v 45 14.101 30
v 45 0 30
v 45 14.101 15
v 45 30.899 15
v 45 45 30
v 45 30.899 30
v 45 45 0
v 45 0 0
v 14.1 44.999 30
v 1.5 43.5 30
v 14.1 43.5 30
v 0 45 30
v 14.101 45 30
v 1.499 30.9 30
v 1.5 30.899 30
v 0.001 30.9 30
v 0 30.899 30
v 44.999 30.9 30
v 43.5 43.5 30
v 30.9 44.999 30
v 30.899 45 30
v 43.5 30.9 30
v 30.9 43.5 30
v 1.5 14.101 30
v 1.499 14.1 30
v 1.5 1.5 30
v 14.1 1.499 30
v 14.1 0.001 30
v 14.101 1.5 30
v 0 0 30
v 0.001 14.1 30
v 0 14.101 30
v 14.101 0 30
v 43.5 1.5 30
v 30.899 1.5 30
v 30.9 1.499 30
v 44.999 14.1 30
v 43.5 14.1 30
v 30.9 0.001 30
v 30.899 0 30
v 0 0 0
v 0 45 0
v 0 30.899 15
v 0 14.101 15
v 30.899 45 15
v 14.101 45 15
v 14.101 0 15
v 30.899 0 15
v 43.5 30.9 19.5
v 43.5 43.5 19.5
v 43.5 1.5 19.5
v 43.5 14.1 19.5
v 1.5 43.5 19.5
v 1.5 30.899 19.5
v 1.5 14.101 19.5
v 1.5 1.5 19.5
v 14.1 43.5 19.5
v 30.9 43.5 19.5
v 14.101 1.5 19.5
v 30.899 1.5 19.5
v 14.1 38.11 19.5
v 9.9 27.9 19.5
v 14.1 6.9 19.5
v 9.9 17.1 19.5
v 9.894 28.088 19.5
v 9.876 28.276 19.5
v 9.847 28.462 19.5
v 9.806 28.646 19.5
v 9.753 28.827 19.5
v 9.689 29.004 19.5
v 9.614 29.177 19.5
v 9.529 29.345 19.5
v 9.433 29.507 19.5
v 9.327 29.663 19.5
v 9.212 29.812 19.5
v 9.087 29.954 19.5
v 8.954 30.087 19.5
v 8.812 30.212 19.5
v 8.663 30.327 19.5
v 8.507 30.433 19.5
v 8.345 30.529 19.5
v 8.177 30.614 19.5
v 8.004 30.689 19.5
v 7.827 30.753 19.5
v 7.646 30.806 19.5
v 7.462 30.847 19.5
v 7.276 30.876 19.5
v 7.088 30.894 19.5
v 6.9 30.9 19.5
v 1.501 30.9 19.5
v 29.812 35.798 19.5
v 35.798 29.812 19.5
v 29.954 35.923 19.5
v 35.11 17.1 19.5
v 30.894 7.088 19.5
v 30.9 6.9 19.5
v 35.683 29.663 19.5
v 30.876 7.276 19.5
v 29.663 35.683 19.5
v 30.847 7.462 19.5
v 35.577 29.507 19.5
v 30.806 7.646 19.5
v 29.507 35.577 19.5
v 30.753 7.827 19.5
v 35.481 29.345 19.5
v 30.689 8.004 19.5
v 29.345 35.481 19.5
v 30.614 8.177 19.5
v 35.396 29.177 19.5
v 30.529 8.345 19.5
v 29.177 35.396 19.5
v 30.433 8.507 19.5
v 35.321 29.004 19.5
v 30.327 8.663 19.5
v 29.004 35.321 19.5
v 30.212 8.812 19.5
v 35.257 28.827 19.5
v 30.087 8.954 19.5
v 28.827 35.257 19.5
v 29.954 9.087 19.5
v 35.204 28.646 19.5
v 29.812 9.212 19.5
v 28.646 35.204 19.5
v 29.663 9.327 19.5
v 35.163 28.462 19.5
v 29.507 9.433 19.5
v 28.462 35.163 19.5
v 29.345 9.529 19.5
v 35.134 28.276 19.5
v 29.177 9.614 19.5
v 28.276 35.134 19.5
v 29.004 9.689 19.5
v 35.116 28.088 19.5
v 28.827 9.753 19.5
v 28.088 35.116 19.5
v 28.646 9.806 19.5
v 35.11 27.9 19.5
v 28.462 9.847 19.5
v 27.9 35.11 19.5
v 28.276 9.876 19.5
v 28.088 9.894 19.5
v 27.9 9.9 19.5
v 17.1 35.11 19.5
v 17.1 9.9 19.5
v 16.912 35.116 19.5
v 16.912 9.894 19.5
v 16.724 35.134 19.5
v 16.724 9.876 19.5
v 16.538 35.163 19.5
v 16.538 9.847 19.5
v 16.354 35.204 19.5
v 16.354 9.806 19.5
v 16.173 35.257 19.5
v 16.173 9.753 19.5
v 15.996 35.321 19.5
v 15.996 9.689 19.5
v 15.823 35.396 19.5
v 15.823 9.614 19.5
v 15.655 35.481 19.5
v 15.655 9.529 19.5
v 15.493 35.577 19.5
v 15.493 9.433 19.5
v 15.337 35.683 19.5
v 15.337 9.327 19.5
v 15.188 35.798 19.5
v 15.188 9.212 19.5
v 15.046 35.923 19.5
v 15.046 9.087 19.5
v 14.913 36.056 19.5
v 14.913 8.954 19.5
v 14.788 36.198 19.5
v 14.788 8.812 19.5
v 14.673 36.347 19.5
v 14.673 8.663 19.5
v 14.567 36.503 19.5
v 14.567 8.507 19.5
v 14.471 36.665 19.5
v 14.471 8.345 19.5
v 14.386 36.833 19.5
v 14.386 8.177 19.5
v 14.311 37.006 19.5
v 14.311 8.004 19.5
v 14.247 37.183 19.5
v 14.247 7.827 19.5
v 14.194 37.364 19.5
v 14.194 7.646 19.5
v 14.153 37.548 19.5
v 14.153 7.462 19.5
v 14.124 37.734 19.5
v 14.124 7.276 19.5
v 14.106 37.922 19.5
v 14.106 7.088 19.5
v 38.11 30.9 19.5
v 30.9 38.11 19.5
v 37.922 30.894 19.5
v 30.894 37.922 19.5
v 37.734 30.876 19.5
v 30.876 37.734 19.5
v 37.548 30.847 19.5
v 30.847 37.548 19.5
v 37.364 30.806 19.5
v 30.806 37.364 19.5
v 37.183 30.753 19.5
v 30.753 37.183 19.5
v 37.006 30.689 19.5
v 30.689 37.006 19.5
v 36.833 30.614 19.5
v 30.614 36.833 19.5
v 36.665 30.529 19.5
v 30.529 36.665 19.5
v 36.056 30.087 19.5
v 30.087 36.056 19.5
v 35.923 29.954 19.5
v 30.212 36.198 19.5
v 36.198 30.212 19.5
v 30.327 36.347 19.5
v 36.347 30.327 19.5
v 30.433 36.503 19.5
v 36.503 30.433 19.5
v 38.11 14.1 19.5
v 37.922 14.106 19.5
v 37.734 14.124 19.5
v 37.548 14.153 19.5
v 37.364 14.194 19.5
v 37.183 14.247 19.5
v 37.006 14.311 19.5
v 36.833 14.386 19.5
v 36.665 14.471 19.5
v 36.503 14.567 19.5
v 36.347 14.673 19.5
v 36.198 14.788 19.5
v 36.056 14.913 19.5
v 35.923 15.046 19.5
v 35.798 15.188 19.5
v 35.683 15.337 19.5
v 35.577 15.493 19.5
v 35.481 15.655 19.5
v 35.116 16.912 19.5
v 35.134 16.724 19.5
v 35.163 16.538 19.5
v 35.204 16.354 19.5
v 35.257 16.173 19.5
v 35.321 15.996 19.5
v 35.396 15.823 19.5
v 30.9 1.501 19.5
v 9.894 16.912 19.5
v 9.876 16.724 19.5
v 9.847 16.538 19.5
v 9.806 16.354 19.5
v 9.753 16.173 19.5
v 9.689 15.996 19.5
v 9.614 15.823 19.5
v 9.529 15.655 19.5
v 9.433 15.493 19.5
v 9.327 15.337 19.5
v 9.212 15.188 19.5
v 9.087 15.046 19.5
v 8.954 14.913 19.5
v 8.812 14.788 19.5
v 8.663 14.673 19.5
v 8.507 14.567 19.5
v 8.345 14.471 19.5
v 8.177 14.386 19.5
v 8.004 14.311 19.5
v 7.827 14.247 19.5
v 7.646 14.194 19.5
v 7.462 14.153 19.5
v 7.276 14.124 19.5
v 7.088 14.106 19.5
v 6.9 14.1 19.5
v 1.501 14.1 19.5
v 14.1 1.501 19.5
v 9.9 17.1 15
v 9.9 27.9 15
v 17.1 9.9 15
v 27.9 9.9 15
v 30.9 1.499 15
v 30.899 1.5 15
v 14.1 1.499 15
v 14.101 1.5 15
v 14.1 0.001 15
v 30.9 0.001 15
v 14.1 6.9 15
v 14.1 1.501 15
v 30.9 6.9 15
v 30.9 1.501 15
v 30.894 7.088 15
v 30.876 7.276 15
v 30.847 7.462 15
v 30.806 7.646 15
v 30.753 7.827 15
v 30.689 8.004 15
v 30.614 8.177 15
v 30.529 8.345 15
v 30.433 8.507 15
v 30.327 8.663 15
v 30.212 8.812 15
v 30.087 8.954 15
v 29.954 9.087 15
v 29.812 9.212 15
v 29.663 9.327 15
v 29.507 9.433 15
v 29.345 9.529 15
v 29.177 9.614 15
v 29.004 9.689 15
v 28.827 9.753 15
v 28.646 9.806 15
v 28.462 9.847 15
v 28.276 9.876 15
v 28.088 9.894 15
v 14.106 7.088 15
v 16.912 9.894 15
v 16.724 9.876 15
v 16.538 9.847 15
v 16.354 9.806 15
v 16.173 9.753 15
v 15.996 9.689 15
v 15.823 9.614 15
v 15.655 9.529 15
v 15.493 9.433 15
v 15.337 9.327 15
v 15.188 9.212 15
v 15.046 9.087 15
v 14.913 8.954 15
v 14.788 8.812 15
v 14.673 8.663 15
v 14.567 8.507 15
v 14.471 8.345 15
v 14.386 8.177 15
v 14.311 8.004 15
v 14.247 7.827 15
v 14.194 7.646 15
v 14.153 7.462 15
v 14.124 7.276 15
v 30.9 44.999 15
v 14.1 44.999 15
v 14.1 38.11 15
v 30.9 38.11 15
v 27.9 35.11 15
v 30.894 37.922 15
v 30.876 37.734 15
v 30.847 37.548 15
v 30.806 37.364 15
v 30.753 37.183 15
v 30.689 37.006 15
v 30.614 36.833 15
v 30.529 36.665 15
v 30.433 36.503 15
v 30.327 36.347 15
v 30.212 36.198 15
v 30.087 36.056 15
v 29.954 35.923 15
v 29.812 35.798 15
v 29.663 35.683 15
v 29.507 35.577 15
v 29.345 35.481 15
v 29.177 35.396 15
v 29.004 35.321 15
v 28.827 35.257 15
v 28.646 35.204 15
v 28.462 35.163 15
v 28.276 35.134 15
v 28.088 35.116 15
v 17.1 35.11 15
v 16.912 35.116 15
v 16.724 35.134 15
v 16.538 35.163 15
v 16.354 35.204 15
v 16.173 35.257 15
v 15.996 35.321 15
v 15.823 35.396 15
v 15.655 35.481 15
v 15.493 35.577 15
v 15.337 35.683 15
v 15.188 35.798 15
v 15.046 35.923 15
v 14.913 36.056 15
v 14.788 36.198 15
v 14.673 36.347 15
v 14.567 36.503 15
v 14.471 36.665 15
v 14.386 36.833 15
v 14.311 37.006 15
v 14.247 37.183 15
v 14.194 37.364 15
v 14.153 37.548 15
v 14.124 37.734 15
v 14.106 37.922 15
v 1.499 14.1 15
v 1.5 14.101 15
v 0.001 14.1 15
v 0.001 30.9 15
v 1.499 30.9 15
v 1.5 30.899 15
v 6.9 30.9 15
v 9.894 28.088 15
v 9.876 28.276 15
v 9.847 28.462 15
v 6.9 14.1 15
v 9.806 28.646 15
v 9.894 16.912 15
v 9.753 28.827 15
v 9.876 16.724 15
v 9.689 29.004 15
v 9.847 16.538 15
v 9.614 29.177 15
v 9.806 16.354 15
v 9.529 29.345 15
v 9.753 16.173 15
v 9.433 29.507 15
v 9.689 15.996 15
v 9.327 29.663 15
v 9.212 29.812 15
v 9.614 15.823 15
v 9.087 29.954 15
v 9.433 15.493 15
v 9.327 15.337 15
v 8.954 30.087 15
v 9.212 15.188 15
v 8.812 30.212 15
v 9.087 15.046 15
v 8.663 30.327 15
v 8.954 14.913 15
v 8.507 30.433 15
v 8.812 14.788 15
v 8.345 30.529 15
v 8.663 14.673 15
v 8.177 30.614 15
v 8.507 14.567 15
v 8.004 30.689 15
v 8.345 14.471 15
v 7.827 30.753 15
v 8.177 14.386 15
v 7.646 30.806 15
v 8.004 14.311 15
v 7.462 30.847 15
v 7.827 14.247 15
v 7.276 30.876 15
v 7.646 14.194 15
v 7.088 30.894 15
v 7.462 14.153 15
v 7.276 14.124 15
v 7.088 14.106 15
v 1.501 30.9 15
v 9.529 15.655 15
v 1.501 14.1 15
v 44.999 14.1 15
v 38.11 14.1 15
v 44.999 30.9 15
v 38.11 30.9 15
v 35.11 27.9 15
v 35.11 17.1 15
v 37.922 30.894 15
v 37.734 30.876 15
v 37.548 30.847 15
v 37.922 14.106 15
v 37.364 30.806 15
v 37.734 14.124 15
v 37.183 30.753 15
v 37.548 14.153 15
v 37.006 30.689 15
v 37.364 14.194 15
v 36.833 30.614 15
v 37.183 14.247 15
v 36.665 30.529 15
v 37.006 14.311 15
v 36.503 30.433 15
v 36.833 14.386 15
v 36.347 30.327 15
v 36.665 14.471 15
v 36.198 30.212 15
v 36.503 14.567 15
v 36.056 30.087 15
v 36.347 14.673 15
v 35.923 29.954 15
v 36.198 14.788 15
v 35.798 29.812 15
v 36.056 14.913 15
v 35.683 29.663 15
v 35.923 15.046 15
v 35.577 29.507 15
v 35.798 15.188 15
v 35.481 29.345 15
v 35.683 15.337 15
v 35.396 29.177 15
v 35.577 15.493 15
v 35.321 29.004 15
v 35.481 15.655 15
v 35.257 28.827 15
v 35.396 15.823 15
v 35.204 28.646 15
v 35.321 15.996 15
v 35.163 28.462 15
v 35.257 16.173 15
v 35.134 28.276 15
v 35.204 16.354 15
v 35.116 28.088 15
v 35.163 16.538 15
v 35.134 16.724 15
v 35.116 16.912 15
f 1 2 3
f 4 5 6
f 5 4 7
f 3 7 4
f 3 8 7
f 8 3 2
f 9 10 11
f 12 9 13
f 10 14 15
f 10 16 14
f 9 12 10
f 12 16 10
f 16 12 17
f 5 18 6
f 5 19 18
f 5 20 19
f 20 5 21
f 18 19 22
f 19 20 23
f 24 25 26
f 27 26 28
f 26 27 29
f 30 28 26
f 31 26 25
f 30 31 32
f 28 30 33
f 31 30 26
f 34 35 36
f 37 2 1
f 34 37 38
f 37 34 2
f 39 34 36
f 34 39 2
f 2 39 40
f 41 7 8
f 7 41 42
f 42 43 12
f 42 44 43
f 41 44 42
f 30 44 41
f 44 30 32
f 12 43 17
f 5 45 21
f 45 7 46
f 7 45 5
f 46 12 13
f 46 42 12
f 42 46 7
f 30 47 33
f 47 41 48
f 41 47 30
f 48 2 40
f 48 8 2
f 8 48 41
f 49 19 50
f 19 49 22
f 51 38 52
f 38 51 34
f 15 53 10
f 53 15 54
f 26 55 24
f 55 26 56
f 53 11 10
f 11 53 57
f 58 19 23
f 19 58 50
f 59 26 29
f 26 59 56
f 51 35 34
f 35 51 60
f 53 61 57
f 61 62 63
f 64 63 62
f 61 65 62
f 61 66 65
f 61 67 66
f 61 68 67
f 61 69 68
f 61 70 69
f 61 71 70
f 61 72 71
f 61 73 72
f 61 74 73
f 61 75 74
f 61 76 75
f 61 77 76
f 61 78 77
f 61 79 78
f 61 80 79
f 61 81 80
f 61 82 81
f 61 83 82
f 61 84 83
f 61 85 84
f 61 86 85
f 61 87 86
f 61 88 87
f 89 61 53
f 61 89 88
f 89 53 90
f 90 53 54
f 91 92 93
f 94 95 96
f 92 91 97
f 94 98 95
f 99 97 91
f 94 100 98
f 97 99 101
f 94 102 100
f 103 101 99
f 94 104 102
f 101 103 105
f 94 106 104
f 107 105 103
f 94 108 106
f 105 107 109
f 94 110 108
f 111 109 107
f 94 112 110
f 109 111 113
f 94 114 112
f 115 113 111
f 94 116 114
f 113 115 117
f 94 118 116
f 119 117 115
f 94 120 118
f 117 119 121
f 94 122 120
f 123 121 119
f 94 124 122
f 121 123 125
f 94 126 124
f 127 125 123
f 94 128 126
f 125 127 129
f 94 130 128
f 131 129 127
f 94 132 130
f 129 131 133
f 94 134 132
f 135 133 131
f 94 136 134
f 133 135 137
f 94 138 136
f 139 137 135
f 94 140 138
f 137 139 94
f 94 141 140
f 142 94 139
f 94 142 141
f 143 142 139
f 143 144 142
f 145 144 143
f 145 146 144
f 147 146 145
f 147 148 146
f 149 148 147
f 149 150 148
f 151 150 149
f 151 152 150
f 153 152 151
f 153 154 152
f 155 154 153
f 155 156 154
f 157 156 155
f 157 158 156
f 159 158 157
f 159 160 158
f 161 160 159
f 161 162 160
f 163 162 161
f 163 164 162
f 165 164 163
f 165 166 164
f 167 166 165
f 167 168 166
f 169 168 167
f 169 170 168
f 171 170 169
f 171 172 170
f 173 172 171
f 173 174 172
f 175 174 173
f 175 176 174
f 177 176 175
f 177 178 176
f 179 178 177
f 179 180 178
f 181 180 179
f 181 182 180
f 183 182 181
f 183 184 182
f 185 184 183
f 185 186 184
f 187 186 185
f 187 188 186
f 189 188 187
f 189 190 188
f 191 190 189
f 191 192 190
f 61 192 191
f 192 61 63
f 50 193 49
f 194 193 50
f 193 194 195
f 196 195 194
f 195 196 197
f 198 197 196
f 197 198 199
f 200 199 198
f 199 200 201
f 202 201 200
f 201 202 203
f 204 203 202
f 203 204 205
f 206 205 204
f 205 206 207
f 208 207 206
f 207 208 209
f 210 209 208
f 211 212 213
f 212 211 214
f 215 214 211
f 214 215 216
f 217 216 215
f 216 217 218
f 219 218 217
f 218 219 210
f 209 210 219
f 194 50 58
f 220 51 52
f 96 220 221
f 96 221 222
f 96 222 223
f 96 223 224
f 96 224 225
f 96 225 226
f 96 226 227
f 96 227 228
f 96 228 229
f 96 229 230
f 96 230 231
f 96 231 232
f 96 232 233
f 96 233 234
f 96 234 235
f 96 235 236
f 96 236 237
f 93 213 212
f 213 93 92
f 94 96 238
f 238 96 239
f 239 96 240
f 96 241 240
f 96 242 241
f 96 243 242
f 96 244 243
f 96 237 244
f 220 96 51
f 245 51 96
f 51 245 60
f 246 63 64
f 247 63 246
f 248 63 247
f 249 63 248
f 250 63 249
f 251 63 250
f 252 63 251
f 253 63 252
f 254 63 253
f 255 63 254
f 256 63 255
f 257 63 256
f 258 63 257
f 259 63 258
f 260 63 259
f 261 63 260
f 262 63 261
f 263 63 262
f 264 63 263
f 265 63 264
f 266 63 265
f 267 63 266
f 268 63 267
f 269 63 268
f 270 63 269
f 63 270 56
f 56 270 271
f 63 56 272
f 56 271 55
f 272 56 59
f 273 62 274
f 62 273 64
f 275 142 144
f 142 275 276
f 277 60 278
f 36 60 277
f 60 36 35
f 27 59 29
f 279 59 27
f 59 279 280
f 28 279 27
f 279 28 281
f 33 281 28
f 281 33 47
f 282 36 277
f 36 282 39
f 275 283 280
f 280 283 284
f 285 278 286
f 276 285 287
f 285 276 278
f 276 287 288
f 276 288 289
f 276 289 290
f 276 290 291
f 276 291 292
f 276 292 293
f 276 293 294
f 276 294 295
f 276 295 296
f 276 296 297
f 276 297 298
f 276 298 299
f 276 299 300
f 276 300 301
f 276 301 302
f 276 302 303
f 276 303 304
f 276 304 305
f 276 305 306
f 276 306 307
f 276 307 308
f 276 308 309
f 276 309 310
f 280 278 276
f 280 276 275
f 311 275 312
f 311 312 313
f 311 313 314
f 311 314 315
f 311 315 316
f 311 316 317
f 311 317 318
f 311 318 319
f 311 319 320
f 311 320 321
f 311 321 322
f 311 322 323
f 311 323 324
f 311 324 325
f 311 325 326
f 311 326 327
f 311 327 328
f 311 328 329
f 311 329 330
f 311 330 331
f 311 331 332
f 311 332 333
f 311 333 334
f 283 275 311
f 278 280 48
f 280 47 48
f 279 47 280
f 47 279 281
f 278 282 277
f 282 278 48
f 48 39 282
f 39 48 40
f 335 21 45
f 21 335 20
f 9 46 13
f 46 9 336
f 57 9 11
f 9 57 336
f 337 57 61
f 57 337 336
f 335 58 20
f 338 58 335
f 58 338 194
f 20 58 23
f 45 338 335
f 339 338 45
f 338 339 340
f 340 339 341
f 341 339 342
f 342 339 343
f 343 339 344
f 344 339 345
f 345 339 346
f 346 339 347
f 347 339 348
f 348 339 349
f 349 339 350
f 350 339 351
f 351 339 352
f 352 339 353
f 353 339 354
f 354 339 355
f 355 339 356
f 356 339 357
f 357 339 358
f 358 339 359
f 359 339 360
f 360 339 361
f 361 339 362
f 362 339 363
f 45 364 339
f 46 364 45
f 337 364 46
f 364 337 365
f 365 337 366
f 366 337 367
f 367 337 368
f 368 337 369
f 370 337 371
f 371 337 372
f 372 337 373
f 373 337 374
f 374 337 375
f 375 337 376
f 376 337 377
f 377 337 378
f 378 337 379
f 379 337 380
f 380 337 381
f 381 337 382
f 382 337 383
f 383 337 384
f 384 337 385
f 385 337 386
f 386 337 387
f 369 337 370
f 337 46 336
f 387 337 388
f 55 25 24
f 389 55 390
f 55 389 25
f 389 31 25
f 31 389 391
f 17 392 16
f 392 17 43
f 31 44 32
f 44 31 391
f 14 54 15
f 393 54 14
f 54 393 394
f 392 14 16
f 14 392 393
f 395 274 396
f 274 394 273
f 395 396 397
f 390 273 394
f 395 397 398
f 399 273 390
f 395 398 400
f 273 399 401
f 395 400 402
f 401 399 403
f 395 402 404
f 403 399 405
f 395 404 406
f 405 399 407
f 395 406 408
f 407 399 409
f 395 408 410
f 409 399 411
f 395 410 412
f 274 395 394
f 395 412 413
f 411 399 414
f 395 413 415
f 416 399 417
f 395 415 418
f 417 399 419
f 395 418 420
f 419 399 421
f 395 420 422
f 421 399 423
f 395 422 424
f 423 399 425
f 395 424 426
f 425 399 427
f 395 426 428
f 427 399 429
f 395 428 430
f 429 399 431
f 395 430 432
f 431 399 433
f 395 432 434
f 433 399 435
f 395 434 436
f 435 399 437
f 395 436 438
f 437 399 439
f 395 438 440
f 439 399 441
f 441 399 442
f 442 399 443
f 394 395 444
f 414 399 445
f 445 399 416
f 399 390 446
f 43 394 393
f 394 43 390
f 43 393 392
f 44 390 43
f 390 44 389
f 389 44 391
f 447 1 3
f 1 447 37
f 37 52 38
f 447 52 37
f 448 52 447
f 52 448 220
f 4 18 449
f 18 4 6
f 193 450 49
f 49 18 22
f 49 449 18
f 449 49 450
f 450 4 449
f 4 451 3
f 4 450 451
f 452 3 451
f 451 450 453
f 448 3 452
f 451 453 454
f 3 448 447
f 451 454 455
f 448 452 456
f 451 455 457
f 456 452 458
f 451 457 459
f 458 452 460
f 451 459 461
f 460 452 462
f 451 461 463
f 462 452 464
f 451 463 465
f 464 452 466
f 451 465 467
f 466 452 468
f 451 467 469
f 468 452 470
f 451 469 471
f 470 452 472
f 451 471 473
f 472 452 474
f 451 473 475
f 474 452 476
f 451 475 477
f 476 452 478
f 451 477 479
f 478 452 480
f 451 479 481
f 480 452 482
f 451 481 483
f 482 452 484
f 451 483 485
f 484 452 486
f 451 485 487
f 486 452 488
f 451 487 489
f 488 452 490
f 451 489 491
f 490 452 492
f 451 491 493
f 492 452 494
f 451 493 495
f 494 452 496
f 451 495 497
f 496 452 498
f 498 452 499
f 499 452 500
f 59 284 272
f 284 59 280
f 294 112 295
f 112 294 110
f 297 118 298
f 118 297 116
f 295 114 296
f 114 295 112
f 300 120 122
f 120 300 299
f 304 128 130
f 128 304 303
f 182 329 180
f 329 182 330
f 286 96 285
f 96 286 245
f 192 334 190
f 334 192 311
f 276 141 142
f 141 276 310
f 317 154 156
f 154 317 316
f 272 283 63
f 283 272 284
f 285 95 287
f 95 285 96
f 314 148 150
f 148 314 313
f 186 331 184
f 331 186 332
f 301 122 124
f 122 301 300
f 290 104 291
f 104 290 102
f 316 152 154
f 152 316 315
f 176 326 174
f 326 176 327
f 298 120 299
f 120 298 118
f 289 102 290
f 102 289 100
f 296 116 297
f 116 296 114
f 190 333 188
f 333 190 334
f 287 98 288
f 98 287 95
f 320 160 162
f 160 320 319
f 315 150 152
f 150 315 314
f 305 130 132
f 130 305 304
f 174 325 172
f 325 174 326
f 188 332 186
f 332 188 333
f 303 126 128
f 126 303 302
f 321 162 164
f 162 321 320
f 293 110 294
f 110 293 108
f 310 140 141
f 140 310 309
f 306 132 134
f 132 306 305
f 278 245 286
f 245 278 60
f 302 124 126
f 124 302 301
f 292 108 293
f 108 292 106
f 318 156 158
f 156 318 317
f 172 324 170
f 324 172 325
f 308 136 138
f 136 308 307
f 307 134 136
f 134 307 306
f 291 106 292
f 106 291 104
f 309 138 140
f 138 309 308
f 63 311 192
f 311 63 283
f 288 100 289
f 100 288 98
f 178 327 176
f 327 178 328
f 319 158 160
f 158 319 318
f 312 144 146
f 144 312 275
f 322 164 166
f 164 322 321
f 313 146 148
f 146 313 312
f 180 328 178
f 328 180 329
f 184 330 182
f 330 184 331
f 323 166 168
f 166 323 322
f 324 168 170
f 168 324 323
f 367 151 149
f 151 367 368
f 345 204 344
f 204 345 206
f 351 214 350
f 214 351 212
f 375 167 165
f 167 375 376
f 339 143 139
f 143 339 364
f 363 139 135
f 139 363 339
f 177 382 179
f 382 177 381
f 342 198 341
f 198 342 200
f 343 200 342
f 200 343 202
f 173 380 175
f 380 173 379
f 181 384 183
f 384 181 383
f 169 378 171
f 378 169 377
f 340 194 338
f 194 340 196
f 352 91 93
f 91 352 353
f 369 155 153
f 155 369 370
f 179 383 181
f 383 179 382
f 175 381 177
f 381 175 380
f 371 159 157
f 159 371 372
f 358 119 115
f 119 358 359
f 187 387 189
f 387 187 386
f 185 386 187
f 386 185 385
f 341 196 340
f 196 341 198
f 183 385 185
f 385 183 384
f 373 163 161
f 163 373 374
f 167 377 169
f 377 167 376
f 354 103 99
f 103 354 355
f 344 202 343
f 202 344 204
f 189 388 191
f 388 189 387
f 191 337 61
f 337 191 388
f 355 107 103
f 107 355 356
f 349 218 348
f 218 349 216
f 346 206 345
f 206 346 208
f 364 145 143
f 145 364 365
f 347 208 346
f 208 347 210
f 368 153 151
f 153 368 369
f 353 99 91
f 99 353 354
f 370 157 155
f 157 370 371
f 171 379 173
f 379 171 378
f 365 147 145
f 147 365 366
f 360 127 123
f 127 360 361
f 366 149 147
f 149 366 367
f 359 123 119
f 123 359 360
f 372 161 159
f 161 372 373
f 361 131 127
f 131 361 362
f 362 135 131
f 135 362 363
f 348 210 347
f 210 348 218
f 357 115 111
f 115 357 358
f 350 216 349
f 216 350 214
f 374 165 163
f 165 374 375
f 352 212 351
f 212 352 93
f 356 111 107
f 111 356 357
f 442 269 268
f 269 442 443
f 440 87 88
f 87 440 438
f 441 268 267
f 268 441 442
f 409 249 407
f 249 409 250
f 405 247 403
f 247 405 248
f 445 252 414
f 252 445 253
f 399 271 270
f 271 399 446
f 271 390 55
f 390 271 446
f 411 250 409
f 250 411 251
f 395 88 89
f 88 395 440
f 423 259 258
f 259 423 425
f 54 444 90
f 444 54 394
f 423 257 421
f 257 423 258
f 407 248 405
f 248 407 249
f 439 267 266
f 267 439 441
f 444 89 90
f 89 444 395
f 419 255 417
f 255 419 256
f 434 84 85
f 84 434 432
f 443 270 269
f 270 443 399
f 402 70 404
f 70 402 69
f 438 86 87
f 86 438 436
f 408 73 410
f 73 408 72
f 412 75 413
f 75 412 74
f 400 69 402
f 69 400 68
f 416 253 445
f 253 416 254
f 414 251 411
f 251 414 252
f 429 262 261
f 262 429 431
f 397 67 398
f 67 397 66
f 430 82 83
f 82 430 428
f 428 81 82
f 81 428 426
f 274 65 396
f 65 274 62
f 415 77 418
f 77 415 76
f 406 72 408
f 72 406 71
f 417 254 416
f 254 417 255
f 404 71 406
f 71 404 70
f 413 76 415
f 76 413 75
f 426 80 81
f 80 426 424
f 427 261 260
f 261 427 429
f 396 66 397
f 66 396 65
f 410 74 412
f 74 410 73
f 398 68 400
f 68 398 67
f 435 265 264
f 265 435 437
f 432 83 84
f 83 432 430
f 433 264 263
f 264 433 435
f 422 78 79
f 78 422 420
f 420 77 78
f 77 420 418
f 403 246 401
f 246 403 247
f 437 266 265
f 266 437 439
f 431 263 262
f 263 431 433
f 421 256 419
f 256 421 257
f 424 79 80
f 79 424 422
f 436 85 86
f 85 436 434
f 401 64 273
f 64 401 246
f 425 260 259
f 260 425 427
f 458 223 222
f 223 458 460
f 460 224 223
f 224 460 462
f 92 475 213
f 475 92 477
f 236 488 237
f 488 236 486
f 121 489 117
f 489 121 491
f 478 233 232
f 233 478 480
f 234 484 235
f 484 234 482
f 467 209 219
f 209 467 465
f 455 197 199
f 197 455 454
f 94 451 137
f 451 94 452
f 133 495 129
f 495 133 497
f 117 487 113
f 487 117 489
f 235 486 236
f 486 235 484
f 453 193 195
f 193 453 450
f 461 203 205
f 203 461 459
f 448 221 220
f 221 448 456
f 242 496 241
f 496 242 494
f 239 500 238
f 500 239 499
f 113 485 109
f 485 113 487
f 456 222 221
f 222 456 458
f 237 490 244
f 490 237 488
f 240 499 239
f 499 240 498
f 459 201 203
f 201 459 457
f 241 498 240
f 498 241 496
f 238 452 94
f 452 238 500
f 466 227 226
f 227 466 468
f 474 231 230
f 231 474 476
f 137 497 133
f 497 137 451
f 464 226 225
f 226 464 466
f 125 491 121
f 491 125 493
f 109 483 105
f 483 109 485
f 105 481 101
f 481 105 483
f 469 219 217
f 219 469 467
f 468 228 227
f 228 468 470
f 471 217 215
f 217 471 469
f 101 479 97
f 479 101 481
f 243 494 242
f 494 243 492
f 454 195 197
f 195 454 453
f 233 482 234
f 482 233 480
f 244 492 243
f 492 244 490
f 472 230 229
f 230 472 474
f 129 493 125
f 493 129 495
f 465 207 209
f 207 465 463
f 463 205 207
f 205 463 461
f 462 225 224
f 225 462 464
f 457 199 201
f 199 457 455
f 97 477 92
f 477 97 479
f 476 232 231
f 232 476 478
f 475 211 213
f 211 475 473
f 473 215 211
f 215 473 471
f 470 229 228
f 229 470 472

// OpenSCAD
include <boardgame_insert_toolkit_lib.2.scad>;

// determines whether lids are output.
g_b_print_lid = true;

// determines whether boxes are output.
g_b_print_box = true; 

// Focus on one box
g_isolated_print_box = "card tray - finger cutout"; 

// Used to visualize how all of the boxes fit together. 
g_b_visualization = true;          
        
// this is the outer wall thickness. 
//Default = 1.5mm
g_wall_thickness = 1.5;


// The tolerance value is extra space put between planes of the lid and box that fit together.
// Increase the tolerance to loosen the fit and decrease it to tighten it.
//
// Note that the tolerance is applied exclusively to the lid.
// So if the lid is too tight or too loose, change this value ( up for looser fit, down for tighter fit ) and 
// you only need to reprint the lid.
// 
// The exception is the stackable box, where the bottom of the box is the lid of the box below,
// in which case the tolerance also affects that box bottom.
//
g_tolerance = 0.15;

// This adjusts the position of the lid detents downward. 
// The larger the value, the bigger the gap between the lid and the box.
g_tolerance_detents_pos = 0.1;

g_b_fit_test=f;
g_b_colorize = t;

data =
[
    [   "simple box",
        [
            [ BOX_SIZE_XYZ,                                     [45, 45, 15.0] ],
            [ BOX_LID,
                [
                    [ LID_SOLID_B, t],
                ]
            ],
            [ BOX_COMPONENT,
                [
                    [CMP_COMPARTMENT_SIZE_XYZ,  [ 42, 42, 13.0] ],
                ]
            ],                            
        ]
    ],

    [   "simple stacking box",
        [
            [ BOX_SIZE_XYZ,                                     [45, 45, 15.0] ],
            [ BOX_STACKABLE_B, t],

            [ BOX_LID,
                [
                    [ LID_SOLID_B, t],
                    [ LID_INSET_B, t],
                ]
            ],
            [ BOX_COMPONENT,
                [
                    [CMP_COMPARTMENT_SIZE_XYZ,  [ 42, 42, 13.0] ],
                ]
            ],                            
        ]
    ],

    [   "card tray - finger cutout",
        [
            [ BOX_SIZE_XYZ,                                     [45, 45, 30.0] ],
            [ BOX_NO_LID_B, t],
            [ BOX_LID,
                [
                    [ LID_SOLID_B, t],
                    
                ]
            ],
            [ BOX_COMPONENT,
                [
                    [CMP_COMPARTMENT_SIZE_XYZ,  [ 42, 42, 10.5] ],
                    //[CMP_SHAPE,                             HEX],
                    //[CMP_SHAPE_VERTICAL_B,                  t],  
                    [CMP_CUTOUT_SIDES_4B,       [t,t,t,t]], // all sides
                    [CMP_CUTOUT_DEPTH_PCT,          20],
                    [CMP_CUTOUT_WIDTH_PCT,          40],
                    [CMP_CUTOUT_HEIGHT_PCT,         50],    
                    [CMP_CUTOUT_TYPE, EXTERIOR ],
                    [CMP_PADDING_XY,             [0,0]],
                    //[POSITION_XY,                   [1,1]],
                    
                ]
            ],                            
        ]
    ],

    [   "card tray - push down",
        [
            [ BOX_SIZE_XYZ,                                     [45, 45, 15.0] ],
            [ BOX_LID,
                [
                    [ LID_SOLID_B, t],
                ]
            ],
            [ BOX_COMPONENT,
                [
                    [CMP_COMPARTMENT_SIZE_XYZ,  [ 42, 42, 7] ],
                    [CMP_PEDESTAL_BASE_B,            t],     
                ]
            ],                            
        ]
    ],    

    [   "labels",
        [
            [ BOX_SIZE_XYZ,                                     [45, 45, 15.0] ],
            [ BOX_LID,
                [
                    [ LABEL,
                        [
                            [ LBL_TEXT,     "Skull     and"],
                            [ LBL_SIZE,     AUTO ],
                            [ ROTATION,     45 ],
                            [ POSITION_XY, [ 2,-2]],
                        ]
                    ],

                    [ LABEL,
                        [
                            [ LBL_TEXT,     "Crossbones"],
                            [ LBL_SIZE,     AUTO ],
                            [ ROTATION,     315 ],
                            [ POSITION_XY, [ -4,-0]],
                        ]
                    ],                      
                ]
            ],

            [ LABEL,
                [
                    [ LBL_TEXT,     "FRONT"],
                    [ LBL_SIZE,     AUTO ],
                    [LBL_PLACEMENT,     FRONT],

                ]
            ],

            [ LABEL,
                [
                    [ LBL_TEXT,     "BOTTOM"],
                    [ LBL_SIZE,     AUTO ],
                    [LBL_PLACEMENT,     BOTTOM],

                ]
            ],            

            [ LABEL,
                [
                    [ LBL_TEXT,     "LEFT"],
                    [ LBL_SIZE,     AUTO ],
 
                    [LBL_PLACEMENT,     LEFT],

                ]
            ],  
            [ LABEL,
                [
                    [ LBL_TEXT,     "BACK"],
                    [ LBL_SIZE,     AUTO ],
                    [LBL_PLACEMENT,     BACK],

                ]
            ],

            [ LABEL,
                [
                    [ LBL_TEXT,     "RIGHT"],
                    [ LBL_SIZE,     AUTO ],
 
                    [LBL_PLACEMENT,     RIGHT],

                ]
            ],  

            [ BOX_COMPONENT,
                [
                    [CMP_NUM_COMPARTMENTS_XY,   [2,2]],
                    [CMP_COMPARTMENT_SIZE_XYZ,  [ 10, 10, 3.0] ],
                    [CMP_PADDING_XY,                        [5,5]],

                    [LABEL,               
                        [
                            [LBL_TEXT,        [   
                                                ["backleft", "backright"],
                                                ["frontleft", "frontright"],
                                            ]
                            ],
                            [LBL_PLACEMENT,     BACK],
                            [ LBL_SIZE,         AUTO],

                        ]
                    ], 

                    [LABEL,               
                        [
                            [LBL_TEXT,        [   
                                                ["backleft", "backright"],
                                                ["frontleft", "frontright"],
                                            ]
                            ],
                            [LBL_PLACEMENT,     BACK_WALL],
                            [ LBL_SIZE,         AUTO],

                        ]
                    ],                                                                
                ]
            ],                            
        ]
    ],

    [   "minimal",
        [
            [ ENABLED_B,                t],

            [ BOX_SIZE_XYZ,                                     [46.5, 46.5, 15.0] ],            [ BOX_COMPONENT,
                [
                    [CMP_NUM_COMPARTMENTS_XY,   [4,4]],
                    [CMP_COMPARTMENT_SIZE_XYZ,  [ 10, 10, 13.0] ],
                    [CMP_PADDING_HEIGHT_ADJUST_XY,          [0, -5] ],
                    [CMP_CUTOUT_SIDES_4B,                   [t,t,t,t]], // all sides
                    [CMP_CUTOUT_DEPTH_PCT,          30],
                    [CMP_CUTOUT_WIDTH_PCT,          50],
                    [CMP_CUTOUT_HEIGHT_PCT,         20],    
                    [ CMP_CUTOUT_TYPE, EXTERIOR ]

                ]
            ],                  
        ]
    ],

    [   "hex tiles",
        [
            [ BOX_SIZE_XYZ,                                     [58, 58, 10.0] ],
            [ BOX_LID,
                [            
                    [ LID_SOLID_B, t],
                ],
            ],
            [ BOX_COMPONENT,
                [
                    [CMP_NUM_COMPARTMENTS_XY,               [2,2]],
                    [CMP_COMPARTMENT_SIZE_XYZ,              [ 25, 25, 8.0] ],
                    [CMP_SHAPE,                             HEX],
                    [CMP_SHAPE_VERTICAL_B,                  t],    
                    [CMP_PADDING_XY,                        [5,5]],
                    [CMP_CUTOUT_TYPE,                      EXTERIOR],
                    [CMP_CUTOUT_SIDES_4B,                   [f,f,t,t]], // all sides
                    [CMP_CUTOUT_BOTTOM_B,                   t]
                    
              

                ]
            ],                  
        ]
    ],    
    [   "hex tiles 2",
        [
            [ BOX_SIZE_XYZ,                                     [55, 55, 10.0] ],
            [ BOX_LID,
                [            
                    [ LID_SOLID_B, t],
                ],
            ],
            [ BOX_COMPONENT,
                [
                    [CMP_NUM_COMPARTMENTS_XY,               [2,2]],
                    [CMP_COMPARTMENT_SIZE_XYZ,              [ 25, 25, 8.0] ],
                    [CMP_SHAPE,                             HEX2],
                    [CMP_SHAPE_VERTICAL_B,                  t],    
                    [CMP_CUTOUT_CORNERS_4B,                 [t,t,t,t]]
              

                ]
            ],                  
        ]
    ],        
    [   "example 1",
        [
            [ ENABLED_B,                t],
            [ BOX_SIZE_XYZ,             [140.0, 180.0, 22.0] ],

            [ BOX_LID,
                [
                    [ LID_FIT_UNDER_B,      f],
                    [ LID_CUTOUT_SIDES_4B, [f,f,t,t]],
                    [ LID_SOLID_B, t],
                    [ LID_HEIGHT, 15 ],
                    [ LID_INSET_B, f],
                ]
            ],

            [ LABEL,
                [
                    [ LBL_TEXT,     "Skull     and"],
                    [ LBL_SIZE,     AUTO ],
                    [ ROTATION,     45 ],
                    [ POSITION_XY, [ 2,-2]],
                ]
            ],

            [ LABEL,
                [
                    [ LBL_TEXT,     "Crossbones"],
                    [ LBL_SIZE,     AUTO ],
                    [ ROTATION,     315 ],
                    [ POSITION_XY, [ -4,-0]],
                ]
            ],        


            [   BOX_COMPONENT,
                [
                    [CMP_COMPARTMENT_SIZE_XYZ,              [ 22, 60.0, 20.0] ],
                    [CMP_NUM_COMPARTMENTS_XY,               [2,2] ],
                    [CMP_SHAPE,                             SQUARE],
                    [CMP_SHAPE_ROTATED_B,                   f],
                    [CMP_SHAPE_VERTICAL_B,                  f],
                    [CMP_PADDING_XY,                        [15,12]],
                    [CMP_PADDING_HEIGHT_ADJUST_XY,          [-5, 0] ],
                    [CMP_MARGIN_FBLR,                       [0,0,15,15]],
                    [CMP_CUTOUT_SIDES_4B,                   [f,f,t,t]],
                    [CMP_CUTOUT_TYPE,                       EXTERIOR],
                    [ROTATION,                              5 ],
                    [LABEL,               
                        [
                            [LBL_TEXT,        [   
                                                ["backleft", "backright"],
                                                ["frontleft", "frontright"],
                                            ]
                            ],
                            [LBL_PLACEMENT,     FRONT],
                            [ ROTATION,         10],
                            [ LBL_SIZE,         AUTO],
                            [ POSITION_XY,      [ -4,-2]],
                            [ LBL_FONT,         "Times New Roman:style=bold italic"],

                        ]
                    ],  
                ]
            ],
                            
        ]
    ],
    [   "shear",
        [
            [ BOX_SIZE_XYZ,                             [50.0, 50.0, 20.0] ],

            [ BOX_LID,
                [
                    [ LID_SOLID_B,       t],
                ]
            ],

            [ BOX_COMPONENT,
                [
                    [CMP_NUM_COMPARTMENTS_XY,       [2,4]],
                    [CMP_COMPARTMENT_SIZE_XYZ,      [ 20, 5.0, 4.0] ],
                    [CMP_SHEAR,                     [0,45]],

                    [LABEL,               
                        [
                            [LBL_TEXT,        [   
                                                [ "1",  "2" ],
                                                [ "3",  "4" ],
                                                [ "4",  "5" ],
                                                [ "6",  "7" ]
                                            ]
                            ],
                            [LBL_PLACEMENT,   BACK_WALL],
                            [LBL_SIZE,        2],
                            
                        ]
                    ],                                                                              
                ]
            ],                              
        ]
    ],

     [   "cards",
        [
            [ BOX_SIZE_XYZ,                                     [ 138, 87, cos(20)*50 - 8] ],
            [ BOX_LID,
                [            
                    [ LID_PATTERN_RADIUS, 10],
                    [ LID_PATTERN_THICKNESS, 1.5],
                    [ LABEL,
                        [
                            [ LBL_TEXT,     "STOCK"],
                            [ LBL_SIZE,     AUTO ],
                        ]
                    ],  

                    [ LID_PATTERN_N1,               10 ],
                    [ LID_PATTERN_N2,               10 ],
                    [ LID_PATTERN_ANGLE,            60 ],
                    [ LID_PATTERN_ROW_OFFSET,       10 ],
                    [ LID_PATTERN_COL_OFFSET,       140 ],
                    [ LID_PATTERN_THICKNESS,        0.6 ],                    

                ],
            ],
            [ BOX_COMPONENT,
                [
                    [CMP_NUM_COMPARTMENTS_XY,       [2,4]],
                    [CMP_COMPARTMENT_SIZE_XYZ,      [  66, 10, 44] ],
                    [CMP_SHEAR,                     [0,40]],
                    [CMP_PADDING_XY,                [ 1, 6]],
                    [CMP_PADDING_HEIGHT_ADJUST_XY,  [ -20,-20]],
                    [CMP_MARGIN_FBLR,               [40,0,0,0]],
                    [POSITION_XY,                   [CENTER,-25]],
                    [CMP_CUTOUT_SIDES_4B,           [t,t,f,f]],
                    [CMP_CUTOUT_DEPTH_PCT,          30],
                    [CMP_CUTOUT_WIDTH_PCT,          50],
                    [CMP_CUTOUT_HEIGHT_PCT,         100],                    
                ]
            ],                  
        ]
    ],          
    [ "divider example 1",
        [
            [ TYPE, DIVIDERS ],
            [ DIV_TAB_TEXT,   ["001","002","003"]],
        ]
    ],
    
    [ "divider example 2",
        [
            [ TYPE,                     DIVIDERS ],

            [ DIV_TAB_TEXT,             ["001","002","PASS","004","010101"]],

            [ DIV_TAB_TEXT_SIZE,        6],

            [ DIV_TAB_SIZE_XY,          [30, 12]],
            [ DIV_TAB_CYCLE,            5],
            [ DIV_TAB_CYCLE_START,      2],

            [ DIV_FRAME_NUM_COLUMNS,    2],
            [ DIV_FRAME_SIZE_XY,        [120, 50]],
            [ DIV_FRAME_COLUMN,         7],


        ]
    ],    

    [   "lid pattern 1",
        [
            [ BOX_SIZE_XYZ,             [50.0, 50.0, 20.0] ],
            [ BOX_COMPONENT,
                [
                    [CMP_COMPARTMENT_SIZE_XYZ,  [ 47, 47, 18.0] ],
                ]
            ],  

             [ BOX_LID,
                [
                    [ LID_PATTERN_RADIUS,         10],        

                    [ LID_PATTERN_N1,               3 ],
                    [ LID_PATTERN_N2,               3 ],
                    [ LID_PATTERN_ANGLE,            0 ],
                    [ LID_PATTERN_ROW_OFFSET,       10 ],
                    [ LID_PATTERN_COL_OFFSET,       140 ],
                    [ LID_PATTERN_THICKNESS,        1 ]
                ]
            ]
        ]
    ],   

    [   "lid pattern 2",
        [
            [ BOX_SIZE_XYZ,             [50.0, 50.0, 20.0] ],
            [ BOX_COMPONENT,
                [
                    [CMP_COMPARTMENT_SIZE_XYZ,  [ 47, 47, 18.0] ],
                ]
            ],  

             [ BOX_LID,
                [
                    [ LID_PATTERN_RADIUS,         10],        
                    [ LID_PATTERN_N1,               8 ],
                    [ LID_PATTERN_N2,               8 ],
                    [ LID_PATTERN_ANGLE,            22.5 ],
                    [ LID_PATTERN_ROW_OFFSET,       10 ],
                    [ LID_PATTERN_COL_OFFSET,       130 ],
                    [ LID_PATTERN_THICKNESS,        0.6 ]
                ]
            ]
        ]
    ],

    [   "lid pattern 3",
        [
            [ BOX_SIZE_XYZ,             [50.0, 50.0, 20.0] ],
            [ BOX_COMPONENT,
                [
                    [CMP_COMPARTMENT_SIZE_XYZ,  [ 47, 47, 18.0] ],
                ]
            ],  

             [ BOX_LID,
                [
                    [ LID_PATTERN_RADIUS,         10],        

                    [ LID_PATTERN_N1,               6 ],
                    [ LID_PATTERN_N2,               3 ],
                    [ LID_PATTERN_ANGLE,            60 ],
                    [ LID_PATTERN_ROW_OFFSET,       10 ],
                    [ LID_PATTERN_COL_OFFSET,       140 ],
                    [ LID_PATTERN_THICKNESS,        0.6 ]
                ]
            ]
        ]
    ],    
    [   "lid label stencil",
        [
            [ BOX_SIZE_XYZ,             [50.0, 50.0, 20.0] ],
            [ BOX_COMPONENT,
                [
                    [CMP_COMPARTMENT_SIZE_XYZ,  [ 47, 47, 18.0] ],
                ]
            ],  

               [ BOX_LID,
                [
                    [ LID_PATTERN_RADIUS,         2],        

                    [LID_LABELS_INVERT_B,t],
                    [LID_LABELS_BG_THICKNESS, 0],
                    [LID_LABELS_BORDER_THICKNESS, 1],
                    [ LABEL,
                        [
                            [ LBL_TEXT,     "STENCIL"],
                        ]
                    ],                        
                ]
            ],
        ]
    ],    


   


];


MakeAll();
